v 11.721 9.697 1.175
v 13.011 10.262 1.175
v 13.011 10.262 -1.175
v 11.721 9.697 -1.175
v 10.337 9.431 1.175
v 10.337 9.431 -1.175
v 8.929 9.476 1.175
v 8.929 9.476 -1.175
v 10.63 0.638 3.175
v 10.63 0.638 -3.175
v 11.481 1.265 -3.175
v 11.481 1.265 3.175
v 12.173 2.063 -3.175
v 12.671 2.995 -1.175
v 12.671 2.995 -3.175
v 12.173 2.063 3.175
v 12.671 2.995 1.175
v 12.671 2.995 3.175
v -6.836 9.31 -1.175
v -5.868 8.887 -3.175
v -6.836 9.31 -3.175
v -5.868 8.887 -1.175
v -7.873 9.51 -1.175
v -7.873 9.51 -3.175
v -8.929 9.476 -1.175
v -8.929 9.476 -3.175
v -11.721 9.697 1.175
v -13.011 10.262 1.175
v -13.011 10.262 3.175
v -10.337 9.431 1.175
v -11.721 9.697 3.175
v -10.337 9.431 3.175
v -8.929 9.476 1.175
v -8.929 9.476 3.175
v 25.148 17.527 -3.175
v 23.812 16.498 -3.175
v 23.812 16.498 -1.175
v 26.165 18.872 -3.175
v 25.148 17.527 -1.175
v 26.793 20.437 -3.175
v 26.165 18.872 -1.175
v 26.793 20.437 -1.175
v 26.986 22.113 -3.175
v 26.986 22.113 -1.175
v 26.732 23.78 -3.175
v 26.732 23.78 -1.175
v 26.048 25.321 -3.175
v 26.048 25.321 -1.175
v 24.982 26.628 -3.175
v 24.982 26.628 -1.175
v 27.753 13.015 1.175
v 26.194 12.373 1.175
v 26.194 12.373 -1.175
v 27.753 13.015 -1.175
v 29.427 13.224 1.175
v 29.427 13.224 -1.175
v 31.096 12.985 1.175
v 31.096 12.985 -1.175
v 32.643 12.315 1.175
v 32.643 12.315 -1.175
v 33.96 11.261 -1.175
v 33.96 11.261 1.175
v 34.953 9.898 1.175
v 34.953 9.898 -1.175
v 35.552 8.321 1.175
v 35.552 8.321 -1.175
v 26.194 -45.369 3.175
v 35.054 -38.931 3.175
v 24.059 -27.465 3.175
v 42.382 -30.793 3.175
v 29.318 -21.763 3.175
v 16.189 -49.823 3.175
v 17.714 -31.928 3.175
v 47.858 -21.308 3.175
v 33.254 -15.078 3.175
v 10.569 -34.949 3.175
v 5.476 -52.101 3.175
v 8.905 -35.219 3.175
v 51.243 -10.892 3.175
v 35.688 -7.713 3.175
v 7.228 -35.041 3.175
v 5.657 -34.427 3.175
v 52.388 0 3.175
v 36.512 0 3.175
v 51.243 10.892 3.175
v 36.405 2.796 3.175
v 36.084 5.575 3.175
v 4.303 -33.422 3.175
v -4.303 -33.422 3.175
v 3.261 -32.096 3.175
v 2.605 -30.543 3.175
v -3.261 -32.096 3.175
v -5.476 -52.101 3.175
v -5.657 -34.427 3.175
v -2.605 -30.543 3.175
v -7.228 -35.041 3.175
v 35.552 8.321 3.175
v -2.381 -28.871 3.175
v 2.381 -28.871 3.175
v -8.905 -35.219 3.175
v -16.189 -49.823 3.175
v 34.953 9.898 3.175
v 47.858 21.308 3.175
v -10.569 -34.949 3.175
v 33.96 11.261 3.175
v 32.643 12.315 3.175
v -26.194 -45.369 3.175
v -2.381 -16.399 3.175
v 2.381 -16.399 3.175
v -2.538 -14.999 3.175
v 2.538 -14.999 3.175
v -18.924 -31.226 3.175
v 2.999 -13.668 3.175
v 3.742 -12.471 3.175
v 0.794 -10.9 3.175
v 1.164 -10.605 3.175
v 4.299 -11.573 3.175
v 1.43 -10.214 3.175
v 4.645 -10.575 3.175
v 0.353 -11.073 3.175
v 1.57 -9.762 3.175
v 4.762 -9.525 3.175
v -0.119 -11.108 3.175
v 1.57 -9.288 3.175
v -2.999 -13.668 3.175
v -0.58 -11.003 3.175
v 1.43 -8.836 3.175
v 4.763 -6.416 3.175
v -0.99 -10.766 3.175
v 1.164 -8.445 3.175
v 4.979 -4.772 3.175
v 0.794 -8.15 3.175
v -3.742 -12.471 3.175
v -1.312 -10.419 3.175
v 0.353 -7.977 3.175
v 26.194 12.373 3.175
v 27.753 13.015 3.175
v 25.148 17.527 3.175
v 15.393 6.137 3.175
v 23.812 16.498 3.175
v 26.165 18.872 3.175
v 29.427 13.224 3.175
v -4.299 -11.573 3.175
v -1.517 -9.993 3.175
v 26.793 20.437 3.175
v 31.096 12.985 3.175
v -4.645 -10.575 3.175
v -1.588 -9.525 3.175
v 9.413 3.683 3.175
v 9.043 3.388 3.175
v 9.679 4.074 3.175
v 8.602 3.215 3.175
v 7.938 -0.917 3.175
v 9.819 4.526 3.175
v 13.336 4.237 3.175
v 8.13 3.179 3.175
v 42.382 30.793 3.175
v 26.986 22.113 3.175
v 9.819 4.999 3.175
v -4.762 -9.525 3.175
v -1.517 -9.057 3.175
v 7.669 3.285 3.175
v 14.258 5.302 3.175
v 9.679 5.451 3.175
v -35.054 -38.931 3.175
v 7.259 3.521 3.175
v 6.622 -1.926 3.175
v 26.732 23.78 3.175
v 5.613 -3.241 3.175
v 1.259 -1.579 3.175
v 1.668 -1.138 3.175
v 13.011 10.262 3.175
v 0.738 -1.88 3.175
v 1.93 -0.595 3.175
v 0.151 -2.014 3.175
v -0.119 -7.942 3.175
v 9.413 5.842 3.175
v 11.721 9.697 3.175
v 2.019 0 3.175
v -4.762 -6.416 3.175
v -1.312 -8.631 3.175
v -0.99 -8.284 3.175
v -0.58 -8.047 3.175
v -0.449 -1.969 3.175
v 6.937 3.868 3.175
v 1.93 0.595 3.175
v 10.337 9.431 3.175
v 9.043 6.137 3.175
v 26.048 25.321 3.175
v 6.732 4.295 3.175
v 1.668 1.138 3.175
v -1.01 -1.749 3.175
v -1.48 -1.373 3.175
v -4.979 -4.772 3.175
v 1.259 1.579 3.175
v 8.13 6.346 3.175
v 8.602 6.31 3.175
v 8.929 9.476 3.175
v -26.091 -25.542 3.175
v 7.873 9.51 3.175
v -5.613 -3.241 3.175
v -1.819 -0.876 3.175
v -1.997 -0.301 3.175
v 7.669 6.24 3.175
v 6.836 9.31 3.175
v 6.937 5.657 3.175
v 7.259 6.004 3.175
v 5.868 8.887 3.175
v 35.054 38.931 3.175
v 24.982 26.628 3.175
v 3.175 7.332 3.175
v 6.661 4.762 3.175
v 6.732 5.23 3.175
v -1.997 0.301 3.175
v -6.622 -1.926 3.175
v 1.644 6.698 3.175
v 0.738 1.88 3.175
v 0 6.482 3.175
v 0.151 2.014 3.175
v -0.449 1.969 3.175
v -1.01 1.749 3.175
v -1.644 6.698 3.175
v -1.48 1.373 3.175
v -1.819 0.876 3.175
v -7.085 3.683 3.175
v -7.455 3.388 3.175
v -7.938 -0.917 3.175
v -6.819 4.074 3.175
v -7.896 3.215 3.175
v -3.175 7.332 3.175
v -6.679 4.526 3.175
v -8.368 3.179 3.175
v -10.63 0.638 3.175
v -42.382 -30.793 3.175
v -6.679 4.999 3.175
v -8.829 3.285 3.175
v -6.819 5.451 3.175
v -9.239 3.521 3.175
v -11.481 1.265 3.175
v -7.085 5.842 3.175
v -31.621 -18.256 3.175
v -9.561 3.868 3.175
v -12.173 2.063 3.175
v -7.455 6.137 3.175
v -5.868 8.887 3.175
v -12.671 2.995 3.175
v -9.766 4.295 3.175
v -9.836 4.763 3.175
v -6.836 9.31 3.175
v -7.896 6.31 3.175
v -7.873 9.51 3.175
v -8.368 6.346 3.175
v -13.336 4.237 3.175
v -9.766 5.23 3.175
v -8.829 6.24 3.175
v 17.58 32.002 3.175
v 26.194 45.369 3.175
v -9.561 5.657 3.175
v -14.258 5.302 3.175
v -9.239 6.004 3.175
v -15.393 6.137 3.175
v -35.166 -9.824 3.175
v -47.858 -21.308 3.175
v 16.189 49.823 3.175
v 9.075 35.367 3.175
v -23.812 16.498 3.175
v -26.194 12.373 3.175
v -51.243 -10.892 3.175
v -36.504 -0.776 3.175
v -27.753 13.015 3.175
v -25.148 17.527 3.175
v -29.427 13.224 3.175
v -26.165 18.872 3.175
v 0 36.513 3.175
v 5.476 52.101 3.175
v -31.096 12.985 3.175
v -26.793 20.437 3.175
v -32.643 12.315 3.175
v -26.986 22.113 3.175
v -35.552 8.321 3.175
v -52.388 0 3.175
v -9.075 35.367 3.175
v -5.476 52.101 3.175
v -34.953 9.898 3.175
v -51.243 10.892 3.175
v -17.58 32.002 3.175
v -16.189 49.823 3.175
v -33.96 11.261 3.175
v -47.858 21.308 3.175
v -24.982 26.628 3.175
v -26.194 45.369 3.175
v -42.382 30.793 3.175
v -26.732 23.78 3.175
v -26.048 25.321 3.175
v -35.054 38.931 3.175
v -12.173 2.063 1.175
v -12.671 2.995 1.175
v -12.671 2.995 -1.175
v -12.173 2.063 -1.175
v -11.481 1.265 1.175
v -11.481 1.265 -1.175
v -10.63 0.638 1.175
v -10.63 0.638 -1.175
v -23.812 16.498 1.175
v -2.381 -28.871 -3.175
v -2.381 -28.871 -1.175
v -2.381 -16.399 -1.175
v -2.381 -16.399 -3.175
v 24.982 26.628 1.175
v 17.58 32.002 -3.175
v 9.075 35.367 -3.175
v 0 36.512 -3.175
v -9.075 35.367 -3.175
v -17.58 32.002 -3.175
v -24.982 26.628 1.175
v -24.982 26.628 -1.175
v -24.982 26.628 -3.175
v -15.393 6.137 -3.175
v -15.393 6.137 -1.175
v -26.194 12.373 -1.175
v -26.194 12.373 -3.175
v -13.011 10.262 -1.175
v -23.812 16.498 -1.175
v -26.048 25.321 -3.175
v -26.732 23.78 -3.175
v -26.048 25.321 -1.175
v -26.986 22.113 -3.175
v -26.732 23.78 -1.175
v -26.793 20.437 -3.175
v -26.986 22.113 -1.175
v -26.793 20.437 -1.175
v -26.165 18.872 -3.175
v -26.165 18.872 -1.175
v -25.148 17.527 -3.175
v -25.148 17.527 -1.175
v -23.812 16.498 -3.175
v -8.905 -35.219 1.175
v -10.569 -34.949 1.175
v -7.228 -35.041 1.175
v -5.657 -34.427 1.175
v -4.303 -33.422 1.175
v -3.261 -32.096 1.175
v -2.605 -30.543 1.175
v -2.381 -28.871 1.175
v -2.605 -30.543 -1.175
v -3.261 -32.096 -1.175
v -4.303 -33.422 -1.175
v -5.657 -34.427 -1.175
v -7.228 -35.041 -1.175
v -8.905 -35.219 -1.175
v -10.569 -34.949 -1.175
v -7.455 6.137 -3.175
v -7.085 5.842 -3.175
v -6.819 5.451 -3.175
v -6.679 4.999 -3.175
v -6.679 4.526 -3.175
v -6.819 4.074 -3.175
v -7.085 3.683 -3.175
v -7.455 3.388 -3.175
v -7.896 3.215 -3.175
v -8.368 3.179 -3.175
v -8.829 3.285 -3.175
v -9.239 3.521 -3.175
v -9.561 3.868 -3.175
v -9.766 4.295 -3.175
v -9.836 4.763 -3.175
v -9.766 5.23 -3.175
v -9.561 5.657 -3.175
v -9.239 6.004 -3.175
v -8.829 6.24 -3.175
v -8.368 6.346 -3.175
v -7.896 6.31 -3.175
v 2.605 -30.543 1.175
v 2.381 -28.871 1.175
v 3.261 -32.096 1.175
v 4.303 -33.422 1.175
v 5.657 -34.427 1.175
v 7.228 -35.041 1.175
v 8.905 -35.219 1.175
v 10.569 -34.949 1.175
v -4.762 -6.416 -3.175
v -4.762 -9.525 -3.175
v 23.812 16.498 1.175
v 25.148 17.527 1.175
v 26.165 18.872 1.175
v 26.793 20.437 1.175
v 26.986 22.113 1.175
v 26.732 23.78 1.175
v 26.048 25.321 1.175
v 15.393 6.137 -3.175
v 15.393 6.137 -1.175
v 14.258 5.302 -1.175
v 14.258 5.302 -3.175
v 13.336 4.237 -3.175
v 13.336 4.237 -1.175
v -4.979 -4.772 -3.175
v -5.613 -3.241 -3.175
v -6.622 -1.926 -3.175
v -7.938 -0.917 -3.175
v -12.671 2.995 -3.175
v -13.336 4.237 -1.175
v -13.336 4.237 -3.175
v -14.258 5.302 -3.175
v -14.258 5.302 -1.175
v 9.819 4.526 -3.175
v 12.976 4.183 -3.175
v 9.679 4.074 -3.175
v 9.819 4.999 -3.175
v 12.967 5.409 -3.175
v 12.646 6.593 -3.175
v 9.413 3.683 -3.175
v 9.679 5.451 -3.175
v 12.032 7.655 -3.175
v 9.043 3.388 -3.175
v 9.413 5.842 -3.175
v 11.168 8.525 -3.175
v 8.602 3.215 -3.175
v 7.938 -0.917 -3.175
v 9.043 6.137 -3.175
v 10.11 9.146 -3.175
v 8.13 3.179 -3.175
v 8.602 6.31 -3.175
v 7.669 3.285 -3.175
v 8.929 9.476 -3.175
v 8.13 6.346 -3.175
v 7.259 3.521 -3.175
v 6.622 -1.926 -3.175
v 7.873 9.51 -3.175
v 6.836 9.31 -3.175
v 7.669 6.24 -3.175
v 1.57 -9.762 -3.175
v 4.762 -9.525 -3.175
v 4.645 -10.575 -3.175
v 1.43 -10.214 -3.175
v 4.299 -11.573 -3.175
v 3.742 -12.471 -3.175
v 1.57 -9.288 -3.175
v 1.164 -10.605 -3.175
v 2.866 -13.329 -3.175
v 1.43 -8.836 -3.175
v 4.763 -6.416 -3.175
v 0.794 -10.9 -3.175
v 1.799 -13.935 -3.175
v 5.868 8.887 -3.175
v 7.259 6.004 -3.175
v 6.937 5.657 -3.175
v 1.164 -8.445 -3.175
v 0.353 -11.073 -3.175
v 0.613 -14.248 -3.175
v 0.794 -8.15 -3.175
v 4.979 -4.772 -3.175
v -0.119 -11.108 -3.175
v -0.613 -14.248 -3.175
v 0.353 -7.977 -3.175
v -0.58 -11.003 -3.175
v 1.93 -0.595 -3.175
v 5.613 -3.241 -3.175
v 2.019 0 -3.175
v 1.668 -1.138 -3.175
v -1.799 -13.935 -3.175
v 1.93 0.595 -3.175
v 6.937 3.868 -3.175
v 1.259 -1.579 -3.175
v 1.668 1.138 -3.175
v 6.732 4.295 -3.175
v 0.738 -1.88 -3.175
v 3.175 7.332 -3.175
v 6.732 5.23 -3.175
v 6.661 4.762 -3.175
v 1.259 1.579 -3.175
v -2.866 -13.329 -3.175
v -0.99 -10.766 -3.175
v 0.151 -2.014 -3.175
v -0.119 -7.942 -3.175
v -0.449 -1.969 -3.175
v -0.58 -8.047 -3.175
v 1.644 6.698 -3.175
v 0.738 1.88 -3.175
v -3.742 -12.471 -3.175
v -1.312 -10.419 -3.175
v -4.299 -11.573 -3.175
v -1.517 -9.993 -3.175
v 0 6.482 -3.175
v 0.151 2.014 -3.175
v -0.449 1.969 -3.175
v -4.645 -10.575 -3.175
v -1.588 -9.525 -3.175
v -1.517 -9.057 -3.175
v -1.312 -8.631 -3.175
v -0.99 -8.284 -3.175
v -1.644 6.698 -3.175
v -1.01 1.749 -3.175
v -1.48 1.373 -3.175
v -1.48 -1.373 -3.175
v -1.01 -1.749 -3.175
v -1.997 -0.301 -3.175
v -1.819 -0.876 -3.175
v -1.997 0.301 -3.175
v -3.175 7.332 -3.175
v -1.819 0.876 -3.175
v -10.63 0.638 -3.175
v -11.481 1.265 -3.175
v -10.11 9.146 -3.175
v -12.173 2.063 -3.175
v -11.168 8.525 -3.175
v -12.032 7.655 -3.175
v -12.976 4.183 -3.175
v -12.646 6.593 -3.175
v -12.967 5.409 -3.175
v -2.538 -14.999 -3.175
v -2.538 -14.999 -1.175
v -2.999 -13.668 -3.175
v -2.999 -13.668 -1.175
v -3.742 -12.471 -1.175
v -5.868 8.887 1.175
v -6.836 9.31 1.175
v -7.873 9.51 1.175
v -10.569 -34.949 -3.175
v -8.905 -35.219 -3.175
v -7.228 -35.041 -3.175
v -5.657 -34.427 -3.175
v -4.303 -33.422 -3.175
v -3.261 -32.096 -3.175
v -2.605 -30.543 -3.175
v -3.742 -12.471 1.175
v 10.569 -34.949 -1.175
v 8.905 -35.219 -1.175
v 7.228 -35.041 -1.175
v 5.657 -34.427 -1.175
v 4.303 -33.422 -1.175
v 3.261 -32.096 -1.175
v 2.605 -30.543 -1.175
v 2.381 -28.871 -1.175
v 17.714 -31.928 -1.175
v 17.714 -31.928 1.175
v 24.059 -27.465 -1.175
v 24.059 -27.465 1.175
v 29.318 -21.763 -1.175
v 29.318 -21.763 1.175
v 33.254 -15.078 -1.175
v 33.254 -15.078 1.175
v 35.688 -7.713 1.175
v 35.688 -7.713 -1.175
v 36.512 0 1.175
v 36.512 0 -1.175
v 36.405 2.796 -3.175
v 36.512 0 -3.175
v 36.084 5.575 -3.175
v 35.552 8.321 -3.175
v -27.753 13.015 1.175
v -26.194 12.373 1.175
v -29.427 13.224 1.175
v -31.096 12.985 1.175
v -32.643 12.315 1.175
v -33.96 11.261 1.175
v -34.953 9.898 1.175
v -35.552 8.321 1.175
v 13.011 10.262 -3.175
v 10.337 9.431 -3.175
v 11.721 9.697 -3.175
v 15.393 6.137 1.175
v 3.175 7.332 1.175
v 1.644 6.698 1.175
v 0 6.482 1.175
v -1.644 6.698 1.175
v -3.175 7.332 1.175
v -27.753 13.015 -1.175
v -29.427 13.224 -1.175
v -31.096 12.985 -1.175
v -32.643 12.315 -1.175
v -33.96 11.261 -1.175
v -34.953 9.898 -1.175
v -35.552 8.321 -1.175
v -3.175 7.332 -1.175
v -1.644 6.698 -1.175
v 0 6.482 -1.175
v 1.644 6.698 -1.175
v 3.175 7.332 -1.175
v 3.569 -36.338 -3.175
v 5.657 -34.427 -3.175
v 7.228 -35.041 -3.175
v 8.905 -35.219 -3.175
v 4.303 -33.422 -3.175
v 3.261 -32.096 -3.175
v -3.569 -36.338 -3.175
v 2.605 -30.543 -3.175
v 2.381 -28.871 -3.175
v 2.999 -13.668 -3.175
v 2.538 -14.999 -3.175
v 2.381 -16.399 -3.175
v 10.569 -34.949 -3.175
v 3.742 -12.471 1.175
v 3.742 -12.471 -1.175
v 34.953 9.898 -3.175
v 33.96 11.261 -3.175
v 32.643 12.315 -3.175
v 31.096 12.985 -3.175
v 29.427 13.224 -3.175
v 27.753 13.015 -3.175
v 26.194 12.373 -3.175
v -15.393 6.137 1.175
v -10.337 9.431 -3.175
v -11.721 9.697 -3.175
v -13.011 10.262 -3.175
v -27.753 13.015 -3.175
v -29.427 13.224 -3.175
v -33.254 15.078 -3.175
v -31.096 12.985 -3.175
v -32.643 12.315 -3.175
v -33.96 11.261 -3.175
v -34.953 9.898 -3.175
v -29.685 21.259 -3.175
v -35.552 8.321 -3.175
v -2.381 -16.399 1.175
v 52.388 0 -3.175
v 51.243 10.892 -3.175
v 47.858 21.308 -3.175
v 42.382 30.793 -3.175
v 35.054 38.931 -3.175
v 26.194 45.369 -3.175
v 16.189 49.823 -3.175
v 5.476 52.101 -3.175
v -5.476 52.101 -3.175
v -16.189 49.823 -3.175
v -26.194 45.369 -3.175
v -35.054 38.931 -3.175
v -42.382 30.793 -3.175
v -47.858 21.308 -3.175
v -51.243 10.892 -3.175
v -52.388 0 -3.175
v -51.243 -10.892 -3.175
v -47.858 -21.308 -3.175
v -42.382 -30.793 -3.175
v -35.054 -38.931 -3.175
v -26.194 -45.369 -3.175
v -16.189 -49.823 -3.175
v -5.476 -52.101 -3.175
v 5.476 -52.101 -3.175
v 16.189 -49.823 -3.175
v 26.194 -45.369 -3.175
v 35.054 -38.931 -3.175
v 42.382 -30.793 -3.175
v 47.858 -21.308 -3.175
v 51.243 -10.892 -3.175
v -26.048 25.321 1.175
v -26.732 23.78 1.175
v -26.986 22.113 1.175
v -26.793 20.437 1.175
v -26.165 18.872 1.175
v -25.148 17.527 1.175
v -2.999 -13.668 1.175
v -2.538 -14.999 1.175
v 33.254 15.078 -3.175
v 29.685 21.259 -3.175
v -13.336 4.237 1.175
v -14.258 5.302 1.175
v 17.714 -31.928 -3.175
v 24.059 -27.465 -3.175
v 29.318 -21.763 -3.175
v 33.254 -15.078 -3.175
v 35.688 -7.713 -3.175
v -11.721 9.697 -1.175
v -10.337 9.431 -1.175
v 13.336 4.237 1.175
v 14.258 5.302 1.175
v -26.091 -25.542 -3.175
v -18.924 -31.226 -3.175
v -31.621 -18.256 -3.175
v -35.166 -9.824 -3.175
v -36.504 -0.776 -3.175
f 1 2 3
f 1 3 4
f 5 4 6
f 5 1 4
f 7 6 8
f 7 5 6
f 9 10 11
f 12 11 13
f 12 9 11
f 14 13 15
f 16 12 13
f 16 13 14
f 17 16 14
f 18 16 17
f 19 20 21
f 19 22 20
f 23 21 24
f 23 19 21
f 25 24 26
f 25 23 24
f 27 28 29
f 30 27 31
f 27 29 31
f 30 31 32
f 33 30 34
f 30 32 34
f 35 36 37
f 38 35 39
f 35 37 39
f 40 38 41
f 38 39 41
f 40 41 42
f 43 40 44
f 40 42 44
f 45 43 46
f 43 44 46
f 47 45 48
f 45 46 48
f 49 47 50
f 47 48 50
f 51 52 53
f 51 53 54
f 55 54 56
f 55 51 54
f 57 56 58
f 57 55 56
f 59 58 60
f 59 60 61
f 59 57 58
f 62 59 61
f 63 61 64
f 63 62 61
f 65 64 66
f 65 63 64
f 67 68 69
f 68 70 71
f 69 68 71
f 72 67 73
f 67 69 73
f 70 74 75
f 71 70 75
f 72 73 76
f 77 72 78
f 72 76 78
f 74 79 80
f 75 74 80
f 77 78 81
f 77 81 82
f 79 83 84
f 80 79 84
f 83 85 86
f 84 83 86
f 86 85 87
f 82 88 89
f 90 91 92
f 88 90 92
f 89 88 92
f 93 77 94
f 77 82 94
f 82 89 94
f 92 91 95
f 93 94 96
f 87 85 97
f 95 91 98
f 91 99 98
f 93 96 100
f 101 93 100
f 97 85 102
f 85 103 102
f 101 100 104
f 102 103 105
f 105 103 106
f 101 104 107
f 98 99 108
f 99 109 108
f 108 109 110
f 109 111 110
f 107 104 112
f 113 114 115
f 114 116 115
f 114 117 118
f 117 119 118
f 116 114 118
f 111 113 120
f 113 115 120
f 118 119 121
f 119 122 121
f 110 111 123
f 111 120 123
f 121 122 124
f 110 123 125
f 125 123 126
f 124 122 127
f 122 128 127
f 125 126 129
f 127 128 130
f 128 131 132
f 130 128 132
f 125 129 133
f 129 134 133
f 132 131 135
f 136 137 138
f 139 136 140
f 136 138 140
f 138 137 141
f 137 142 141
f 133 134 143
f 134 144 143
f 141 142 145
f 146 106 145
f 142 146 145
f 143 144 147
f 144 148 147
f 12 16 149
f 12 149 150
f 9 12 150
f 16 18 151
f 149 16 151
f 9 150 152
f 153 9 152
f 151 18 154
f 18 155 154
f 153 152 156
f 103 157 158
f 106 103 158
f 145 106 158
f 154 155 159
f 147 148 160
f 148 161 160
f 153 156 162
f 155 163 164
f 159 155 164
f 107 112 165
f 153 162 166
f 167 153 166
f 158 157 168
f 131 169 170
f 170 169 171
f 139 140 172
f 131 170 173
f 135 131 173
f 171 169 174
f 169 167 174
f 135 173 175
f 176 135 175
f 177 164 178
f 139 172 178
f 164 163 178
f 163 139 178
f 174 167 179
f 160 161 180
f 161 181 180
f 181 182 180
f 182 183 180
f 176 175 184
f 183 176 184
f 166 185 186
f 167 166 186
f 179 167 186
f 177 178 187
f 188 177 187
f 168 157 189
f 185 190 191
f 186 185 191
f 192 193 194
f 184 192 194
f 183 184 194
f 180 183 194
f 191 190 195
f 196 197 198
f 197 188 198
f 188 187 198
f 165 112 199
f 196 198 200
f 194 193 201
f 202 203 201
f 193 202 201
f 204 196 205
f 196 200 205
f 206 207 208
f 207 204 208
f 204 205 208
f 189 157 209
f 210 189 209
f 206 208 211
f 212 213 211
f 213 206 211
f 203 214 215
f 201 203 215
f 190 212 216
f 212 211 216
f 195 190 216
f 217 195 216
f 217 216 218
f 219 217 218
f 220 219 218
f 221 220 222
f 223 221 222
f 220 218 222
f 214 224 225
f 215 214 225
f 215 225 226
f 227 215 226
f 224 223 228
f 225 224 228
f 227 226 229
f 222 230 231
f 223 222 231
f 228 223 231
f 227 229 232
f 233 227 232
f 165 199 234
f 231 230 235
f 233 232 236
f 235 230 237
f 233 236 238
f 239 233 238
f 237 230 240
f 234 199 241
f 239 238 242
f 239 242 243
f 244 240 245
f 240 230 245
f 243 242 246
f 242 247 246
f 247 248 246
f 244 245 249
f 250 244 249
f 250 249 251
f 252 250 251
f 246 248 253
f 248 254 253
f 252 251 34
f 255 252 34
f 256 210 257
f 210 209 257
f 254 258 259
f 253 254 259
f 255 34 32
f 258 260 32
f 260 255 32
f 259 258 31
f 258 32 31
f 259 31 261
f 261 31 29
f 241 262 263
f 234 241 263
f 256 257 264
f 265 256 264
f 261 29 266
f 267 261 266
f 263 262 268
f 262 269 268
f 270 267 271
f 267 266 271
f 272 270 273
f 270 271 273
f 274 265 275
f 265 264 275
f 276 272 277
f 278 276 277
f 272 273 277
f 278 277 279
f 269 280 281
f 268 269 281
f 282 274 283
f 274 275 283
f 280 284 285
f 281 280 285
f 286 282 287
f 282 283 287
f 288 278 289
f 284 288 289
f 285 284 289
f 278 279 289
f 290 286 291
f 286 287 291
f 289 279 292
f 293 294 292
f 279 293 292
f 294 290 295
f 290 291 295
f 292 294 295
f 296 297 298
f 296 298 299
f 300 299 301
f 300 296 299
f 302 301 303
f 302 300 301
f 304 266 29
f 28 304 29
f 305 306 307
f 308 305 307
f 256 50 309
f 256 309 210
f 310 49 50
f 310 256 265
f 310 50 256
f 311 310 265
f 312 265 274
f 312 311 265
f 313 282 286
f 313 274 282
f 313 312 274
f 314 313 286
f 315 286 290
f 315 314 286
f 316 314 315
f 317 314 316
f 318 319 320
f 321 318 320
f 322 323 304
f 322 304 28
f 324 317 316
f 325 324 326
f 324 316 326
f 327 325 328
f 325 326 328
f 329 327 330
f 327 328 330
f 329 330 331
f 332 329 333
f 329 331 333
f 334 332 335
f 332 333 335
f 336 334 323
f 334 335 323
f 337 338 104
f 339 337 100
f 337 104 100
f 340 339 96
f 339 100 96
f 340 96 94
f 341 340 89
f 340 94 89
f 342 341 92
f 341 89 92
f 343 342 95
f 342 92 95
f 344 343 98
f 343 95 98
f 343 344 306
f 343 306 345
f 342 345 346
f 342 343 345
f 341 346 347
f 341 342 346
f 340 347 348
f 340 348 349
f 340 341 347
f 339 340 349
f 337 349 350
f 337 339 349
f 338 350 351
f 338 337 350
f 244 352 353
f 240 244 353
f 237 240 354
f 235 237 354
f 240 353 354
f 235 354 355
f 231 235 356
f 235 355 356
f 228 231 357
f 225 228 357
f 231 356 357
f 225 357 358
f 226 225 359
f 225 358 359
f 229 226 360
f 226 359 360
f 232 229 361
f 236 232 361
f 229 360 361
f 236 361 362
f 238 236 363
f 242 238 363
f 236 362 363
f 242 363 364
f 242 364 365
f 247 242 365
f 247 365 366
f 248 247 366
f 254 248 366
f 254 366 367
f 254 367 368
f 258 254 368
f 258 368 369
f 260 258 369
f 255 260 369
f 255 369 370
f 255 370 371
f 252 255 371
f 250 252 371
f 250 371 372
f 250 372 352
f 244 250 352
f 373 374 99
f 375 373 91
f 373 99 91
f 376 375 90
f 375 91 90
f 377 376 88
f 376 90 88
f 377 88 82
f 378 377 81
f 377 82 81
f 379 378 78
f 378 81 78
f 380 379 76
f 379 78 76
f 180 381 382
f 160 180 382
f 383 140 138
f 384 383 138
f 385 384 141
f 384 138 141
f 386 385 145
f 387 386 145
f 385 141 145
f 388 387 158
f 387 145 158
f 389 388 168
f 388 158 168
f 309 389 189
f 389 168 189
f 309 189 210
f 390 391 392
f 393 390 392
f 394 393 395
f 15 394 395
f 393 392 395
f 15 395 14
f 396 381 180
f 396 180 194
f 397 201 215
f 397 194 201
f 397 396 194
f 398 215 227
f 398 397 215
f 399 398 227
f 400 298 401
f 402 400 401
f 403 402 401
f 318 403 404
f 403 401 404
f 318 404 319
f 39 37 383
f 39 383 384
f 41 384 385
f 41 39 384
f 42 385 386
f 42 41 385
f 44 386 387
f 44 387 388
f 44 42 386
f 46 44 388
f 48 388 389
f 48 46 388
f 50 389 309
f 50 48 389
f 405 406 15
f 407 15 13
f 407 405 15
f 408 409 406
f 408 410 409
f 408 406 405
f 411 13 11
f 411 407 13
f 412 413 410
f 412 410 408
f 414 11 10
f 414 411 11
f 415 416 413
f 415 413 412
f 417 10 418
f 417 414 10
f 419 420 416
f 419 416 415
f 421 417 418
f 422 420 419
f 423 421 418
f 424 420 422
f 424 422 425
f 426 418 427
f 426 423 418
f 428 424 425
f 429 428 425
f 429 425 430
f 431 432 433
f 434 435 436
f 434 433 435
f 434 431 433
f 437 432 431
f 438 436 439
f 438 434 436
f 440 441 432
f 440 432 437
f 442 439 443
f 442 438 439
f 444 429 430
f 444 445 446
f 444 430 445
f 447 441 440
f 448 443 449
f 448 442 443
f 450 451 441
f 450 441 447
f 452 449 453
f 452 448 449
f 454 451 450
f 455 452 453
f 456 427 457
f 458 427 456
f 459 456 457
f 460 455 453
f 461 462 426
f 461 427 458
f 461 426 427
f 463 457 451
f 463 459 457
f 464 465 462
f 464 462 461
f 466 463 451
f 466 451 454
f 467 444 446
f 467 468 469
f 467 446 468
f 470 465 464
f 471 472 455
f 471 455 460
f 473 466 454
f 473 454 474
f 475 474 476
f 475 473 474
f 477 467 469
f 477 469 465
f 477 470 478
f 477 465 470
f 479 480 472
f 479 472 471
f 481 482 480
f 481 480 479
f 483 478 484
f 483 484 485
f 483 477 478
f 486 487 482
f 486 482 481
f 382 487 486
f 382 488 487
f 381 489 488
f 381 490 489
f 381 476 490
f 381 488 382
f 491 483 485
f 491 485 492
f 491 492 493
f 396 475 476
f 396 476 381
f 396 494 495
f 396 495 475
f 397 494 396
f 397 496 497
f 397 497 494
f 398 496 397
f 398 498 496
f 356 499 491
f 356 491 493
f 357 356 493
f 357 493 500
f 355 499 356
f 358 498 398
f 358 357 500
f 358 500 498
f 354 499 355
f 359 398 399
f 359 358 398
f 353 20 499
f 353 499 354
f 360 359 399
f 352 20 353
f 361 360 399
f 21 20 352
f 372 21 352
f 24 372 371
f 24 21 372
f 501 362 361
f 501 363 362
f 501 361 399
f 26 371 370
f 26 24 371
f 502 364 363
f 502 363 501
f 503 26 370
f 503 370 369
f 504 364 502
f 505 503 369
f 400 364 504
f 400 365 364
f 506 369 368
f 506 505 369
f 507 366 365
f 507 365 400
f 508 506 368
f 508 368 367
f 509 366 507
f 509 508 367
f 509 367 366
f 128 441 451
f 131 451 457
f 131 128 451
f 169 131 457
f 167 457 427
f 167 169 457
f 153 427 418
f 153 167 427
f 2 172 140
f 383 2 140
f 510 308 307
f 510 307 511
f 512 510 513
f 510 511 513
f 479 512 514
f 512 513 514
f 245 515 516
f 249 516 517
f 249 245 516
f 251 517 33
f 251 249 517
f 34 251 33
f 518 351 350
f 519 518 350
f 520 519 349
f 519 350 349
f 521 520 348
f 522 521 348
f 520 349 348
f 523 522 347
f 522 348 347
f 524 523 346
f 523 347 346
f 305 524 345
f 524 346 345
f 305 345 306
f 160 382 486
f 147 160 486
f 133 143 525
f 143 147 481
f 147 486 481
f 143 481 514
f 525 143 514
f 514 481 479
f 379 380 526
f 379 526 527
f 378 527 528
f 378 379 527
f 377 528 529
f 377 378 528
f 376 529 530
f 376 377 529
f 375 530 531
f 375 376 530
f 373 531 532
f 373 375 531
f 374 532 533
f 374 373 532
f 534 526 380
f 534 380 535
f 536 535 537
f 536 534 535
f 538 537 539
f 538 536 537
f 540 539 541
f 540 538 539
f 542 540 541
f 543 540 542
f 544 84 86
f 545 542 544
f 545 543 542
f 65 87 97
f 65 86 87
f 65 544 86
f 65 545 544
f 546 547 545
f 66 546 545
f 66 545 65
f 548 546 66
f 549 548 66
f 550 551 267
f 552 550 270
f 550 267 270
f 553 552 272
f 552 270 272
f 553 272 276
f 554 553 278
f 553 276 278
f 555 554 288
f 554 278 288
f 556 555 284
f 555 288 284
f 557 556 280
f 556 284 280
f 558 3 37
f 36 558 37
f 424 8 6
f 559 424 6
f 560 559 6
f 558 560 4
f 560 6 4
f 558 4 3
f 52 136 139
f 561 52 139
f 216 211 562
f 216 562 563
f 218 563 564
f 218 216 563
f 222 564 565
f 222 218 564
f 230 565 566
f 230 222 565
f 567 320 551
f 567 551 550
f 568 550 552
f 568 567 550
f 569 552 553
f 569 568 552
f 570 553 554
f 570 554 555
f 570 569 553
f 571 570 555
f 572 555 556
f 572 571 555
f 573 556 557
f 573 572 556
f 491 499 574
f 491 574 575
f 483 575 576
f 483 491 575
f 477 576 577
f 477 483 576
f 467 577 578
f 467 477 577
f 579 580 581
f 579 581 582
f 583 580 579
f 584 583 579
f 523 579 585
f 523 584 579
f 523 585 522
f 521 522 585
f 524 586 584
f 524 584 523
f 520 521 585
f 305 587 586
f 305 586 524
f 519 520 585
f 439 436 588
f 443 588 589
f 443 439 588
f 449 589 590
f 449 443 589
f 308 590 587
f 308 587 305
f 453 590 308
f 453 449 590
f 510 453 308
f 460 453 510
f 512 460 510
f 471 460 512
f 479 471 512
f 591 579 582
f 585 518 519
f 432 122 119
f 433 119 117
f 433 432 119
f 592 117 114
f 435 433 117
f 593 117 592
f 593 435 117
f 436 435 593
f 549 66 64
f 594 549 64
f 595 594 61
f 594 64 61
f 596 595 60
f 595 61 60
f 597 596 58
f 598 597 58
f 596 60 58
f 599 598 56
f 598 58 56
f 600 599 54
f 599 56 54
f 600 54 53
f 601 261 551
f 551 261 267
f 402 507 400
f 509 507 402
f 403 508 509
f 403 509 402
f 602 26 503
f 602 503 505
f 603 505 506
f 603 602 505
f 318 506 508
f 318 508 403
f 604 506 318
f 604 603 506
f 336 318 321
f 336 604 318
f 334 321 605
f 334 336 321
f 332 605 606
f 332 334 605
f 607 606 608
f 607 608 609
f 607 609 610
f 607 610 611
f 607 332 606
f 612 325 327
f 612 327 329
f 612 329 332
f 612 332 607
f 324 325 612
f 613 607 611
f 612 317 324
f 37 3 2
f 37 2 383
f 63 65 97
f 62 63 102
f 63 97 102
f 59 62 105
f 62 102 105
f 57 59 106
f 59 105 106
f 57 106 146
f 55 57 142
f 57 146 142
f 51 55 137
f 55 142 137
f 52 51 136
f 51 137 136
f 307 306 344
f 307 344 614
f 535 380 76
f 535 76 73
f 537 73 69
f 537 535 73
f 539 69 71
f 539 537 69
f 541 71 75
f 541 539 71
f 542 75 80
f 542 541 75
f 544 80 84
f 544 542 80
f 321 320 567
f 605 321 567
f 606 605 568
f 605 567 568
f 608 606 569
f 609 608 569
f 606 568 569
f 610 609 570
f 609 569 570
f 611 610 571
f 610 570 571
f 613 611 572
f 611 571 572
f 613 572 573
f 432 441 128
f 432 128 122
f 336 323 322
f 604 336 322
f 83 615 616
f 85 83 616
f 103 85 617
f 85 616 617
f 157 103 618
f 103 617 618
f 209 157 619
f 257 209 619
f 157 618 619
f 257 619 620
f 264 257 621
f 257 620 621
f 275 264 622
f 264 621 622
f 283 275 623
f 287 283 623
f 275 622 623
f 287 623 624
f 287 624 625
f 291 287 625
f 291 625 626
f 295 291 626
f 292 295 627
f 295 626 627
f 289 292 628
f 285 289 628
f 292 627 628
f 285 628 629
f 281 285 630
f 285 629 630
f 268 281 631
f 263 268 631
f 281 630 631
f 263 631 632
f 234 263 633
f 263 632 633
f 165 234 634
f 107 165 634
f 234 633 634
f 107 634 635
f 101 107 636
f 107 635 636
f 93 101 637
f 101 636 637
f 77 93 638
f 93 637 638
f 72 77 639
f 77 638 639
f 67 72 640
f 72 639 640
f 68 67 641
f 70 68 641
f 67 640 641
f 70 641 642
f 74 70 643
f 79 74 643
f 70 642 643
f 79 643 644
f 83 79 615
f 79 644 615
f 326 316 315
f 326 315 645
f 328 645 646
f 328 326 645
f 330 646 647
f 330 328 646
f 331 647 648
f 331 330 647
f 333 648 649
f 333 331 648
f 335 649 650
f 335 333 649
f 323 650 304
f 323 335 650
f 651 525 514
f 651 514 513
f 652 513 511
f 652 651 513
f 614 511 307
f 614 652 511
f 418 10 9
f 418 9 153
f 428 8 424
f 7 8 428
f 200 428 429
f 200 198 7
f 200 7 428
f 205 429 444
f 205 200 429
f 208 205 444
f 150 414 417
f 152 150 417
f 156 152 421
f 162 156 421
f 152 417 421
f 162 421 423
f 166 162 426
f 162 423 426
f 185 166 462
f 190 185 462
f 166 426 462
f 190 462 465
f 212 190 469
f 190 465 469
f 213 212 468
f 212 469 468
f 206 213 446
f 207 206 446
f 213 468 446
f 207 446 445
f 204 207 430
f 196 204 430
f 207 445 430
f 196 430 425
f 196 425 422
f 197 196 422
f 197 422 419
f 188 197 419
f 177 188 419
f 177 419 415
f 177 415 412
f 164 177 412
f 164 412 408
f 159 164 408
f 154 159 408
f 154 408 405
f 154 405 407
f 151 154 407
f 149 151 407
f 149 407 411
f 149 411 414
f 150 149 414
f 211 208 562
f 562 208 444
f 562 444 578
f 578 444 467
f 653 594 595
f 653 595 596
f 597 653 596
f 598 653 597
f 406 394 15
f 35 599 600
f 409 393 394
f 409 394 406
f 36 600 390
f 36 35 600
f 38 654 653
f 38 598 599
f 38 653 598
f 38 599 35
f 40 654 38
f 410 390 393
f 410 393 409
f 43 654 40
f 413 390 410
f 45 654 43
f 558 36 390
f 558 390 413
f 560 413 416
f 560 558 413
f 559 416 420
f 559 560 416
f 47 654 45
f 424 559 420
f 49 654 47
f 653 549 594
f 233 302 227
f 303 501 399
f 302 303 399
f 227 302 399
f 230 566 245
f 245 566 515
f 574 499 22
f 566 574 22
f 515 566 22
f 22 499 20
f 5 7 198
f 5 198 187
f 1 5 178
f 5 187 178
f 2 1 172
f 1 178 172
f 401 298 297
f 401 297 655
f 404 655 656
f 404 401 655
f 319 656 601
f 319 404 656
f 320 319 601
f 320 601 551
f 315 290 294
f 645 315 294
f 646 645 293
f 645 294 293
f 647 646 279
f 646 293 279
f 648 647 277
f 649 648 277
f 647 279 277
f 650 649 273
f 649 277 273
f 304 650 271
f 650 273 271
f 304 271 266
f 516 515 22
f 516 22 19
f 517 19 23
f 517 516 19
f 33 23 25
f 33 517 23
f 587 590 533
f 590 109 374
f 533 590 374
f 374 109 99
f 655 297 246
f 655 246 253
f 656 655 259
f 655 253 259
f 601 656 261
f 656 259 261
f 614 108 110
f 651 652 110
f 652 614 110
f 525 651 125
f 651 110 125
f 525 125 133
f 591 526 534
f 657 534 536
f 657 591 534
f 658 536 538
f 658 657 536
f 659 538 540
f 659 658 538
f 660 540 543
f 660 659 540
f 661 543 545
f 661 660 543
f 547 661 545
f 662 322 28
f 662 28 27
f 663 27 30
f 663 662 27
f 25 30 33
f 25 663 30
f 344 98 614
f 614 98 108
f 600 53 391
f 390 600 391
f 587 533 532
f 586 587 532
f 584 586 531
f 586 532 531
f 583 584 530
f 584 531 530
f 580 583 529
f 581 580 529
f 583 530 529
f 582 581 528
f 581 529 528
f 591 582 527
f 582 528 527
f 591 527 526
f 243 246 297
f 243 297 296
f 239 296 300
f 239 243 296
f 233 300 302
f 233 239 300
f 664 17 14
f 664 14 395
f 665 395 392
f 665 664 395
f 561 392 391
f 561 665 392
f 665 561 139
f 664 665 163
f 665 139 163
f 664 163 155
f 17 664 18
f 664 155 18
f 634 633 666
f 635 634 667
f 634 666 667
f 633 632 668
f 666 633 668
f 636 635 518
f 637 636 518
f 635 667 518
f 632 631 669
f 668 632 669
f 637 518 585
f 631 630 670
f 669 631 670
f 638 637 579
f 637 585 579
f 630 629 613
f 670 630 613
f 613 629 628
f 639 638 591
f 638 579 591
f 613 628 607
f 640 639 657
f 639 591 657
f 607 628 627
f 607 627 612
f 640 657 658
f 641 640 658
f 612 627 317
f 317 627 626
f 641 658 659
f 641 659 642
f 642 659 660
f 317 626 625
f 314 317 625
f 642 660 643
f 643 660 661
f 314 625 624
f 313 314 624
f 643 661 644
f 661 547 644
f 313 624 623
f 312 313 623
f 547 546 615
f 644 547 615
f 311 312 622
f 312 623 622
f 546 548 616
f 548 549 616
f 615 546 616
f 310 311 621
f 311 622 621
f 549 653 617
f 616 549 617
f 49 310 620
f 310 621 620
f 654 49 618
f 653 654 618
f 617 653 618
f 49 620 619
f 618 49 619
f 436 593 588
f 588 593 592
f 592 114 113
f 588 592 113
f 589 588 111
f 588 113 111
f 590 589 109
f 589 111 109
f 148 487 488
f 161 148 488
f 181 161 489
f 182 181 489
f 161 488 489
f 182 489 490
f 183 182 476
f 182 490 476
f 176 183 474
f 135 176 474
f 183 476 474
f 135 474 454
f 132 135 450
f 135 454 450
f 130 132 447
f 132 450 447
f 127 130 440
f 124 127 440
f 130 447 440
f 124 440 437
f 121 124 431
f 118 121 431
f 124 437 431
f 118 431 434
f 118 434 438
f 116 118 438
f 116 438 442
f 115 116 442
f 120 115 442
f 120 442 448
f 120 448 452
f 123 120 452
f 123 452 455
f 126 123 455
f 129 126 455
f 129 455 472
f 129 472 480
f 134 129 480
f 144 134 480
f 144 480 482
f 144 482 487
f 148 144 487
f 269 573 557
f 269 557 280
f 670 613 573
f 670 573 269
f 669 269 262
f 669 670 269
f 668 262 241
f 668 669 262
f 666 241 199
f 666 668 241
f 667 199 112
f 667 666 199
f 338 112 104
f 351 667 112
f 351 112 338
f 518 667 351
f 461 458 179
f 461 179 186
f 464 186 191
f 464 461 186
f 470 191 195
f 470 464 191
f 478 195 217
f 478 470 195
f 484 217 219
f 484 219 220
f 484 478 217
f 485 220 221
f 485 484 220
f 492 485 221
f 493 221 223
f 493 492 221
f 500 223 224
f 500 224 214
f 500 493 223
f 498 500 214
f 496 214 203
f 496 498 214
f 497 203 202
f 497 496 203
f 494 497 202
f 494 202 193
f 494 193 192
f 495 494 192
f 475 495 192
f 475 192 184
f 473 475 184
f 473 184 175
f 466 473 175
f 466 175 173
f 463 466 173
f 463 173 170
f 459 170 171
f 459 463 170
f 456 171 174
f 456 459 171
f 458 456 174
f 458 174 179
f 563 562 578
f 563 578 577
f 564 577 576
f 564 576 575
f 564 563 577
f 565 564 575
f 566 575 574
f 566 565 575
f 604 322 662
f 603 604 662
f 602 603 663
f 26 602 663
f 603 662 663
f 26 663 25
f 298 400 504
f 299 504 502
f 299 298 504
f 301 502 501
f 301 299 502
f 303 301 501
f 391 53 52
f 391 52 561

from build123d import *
from build123d.topology import SkipClean

# Parameters (mm, degrees)
BOSS_EXTRUDE1_DEPTH              = 3.175
BOSS_EXTRUDE1_DEPTH_BACK         = 3.175
SKETCH1_R                        = 52.3875
SKETCH1_R_2                      = 2.0193
SHAFT_COUPLER_BOLT_D             = 3.175
SHAFT_COUPLER_BOLT_PATTERN_COUNT = 3
SKETCH6_R                        = 36.5125
CUT_EXTRUDE2_DEPTH               = 2
VOID_CUT_DEPTH                   = 75.214707521
VOID_CUT_DEPTH_BACK              = 75.214707521
TOOLING_RADIUS_R                 = 6.35
BOSS_EXTRUDE2_START              = -4.35
BOSS_EXTRUDE2_DEPTH              = 6.35


# Read off the part's stored shape, not the designer's step: Boss-Extrude2
with BuildPart() as part:
    # Sketch1 → Boss-Extrude1 (new, two sides: drawn at the far end of the back side and taken through both)
    with BuildSketch(Plane.XY.offset(-BOSS_EXTRUDE1_DEPTH_BACK)):
        Circle(SKETCH1_R)
        Circle(SKETCH1_R_2, mode=Mode.SUBTRACT)
    extrude(amount=BOSS_EXTRUDE1_DEPTH + BOSS_EXTRUDE1_DEPTH_BACK)

    # SHAFT-COUPLER-BOLT (through all)
    with Locations(Plane.XY.offset(3.175)):
        with Locations((0, -9.525)):
            shaft_coupler_bolt = Hole(SHAFT_COUPLER_BOLT_D / 2)

    # SHAFT-COUPLER-BOLT-PATTERN: SHAFT-COUPLER-BOLT ×3 about axis
    shaft_coupler_bolt_pattern_axis = Axis((0, 0, 0), (0, 0, 1))
    for i in range(1, SHAFT_COUPLER_BOLT_PATTERN_COUNT):
        add(shaft_coupler_bolt.rotate(shaft_coupler_bolt_pattern_axis, i * 360 / SHAFT_COUPLER_BOLT_PATTERN_COUNT), mode=Mode.SUBTRACT)

    # Sketch6 → Cut-Extrude2 (cut)
    with BuildSketch(Plane.XY.offset(3.175)):
        Circle(SKETCH6_R)
        with BuildLine():
            Line((4.7625, -9.525), (4.7625, -2.749630657))
            Line((4.7625, -2.749630657), (10.630141971, 0.638054014))
            ThreePointArc((10.630141971, 0.638054014), (12.373337957, 7.14375), (5.867641971, 8.886945986))
            Line((5.867641971, 8.886945986), (0, 5.499261314))
            Line((0, 5.499261314), (-5.867641971, 8.886945986))
            ThreePointArc((-5.867641971, 8.886945986), (-12.373337957, 7.14375), (-10.630141971, 0.638054014))
            Line((-10.630141971, 0.638054014), (-4.7625, -2.749630657))
            Line((-4.7625, -2.749630657), (-4.7625, -9.525))
            ThreePointArc((-4.7625, -9.525), (0, -14.2875), (4.7625, -9.525))
        make_face(mode=Mode.SUBTRACT)
    cut_extrude2 = extrude(amount=-CUT_EXTRUDE2_DEPTH, mode=Mode.SUBTRACT)

    # Mirror1: Cut-Extrude2 across plane
    add(cut_extrude2.mirror(Plane.XY), mode=Mode.SUBTRACT)

    # Sketch7 → VOID-CUT (cut, two sides: drawn at the far end of the back side and taken through both)
    with BuildSketch(Plane.XY.offset(1.175).offset(-VOID_CUT_DEPTH_BACK)):
        with BuildLine():
            Line((2.38125, -13.649445986), (2.38125, -36.434767801))
            ThreePointArc((2.38125, -36.434767801), (26.646838901, -24.962143995), (36.5125, 0))
            ThreePointArc((36.5125, 0), (35.557911417, 8.294431382), (32.744059496, 16.155160908))
            Line((32.744059496, 16.155160908), (13.011391971, 4.7625))
            ThreePointArc((13.011391971, 4.7625), (12.373337957, 2.38125), (10.630141971, 0.638054014))
            Line((10.630141971, 0.638054014), (4.7625, -2.749630657))
            Line((4.7625, -2.749630657), (4.7625, -9.525))
            ThreePointArc((4.7625, -9.525), (4.124445986, -11.90625), (2.38125, -13.649445986))
        make_face()
        with BuildLine():
            ThreePointArc((-32.744059496, 16.155160908), (-31.620752556, -18.25625), (-2.38125, -36.434767801))
            Line((-2.38125, -36.434767801), (-2.38125, -13.649445986))
            ThreePointArc((-2.38125, -13.649445986), (-4.124445986, -11.90625), (-4.7625, -9.525))
            Line((-4.7625, -9.525), (-4.7625, -2.749630657))
            Line((-4.7625, -2.749630657), (-10.630141971, 0.638054014))
            ThreePointArc((-10.630141971, 0.638054014), (-12.373337957, 2.38125), (-13.011391971, 4.7625))
            Line((-13.011391971, 4.7625), (-32.744059496, 16.155160908))
        make_face()
        with BuildLine():
            ThreePointArc((30.362809496, 20.279606893), (0, 36.5125), (-30.362809496, 20.279606893))
            Line((-30.362809496, 20.279606893), (-10.630141971, 8.886945986))
            ThreePointArc((-10.630141971, 8.886945986), (-8.248891971, 9.525), (-5.867641971, 8.886945986))
            Line((-5.867641971, 8.886945986), (0, 5.499261314))
            Line((0, 5.499261314), (5.867641971, 8.886945986))
            ThreePointArc((5.867641971, 8.886945986), (8.248891971, 9.525), (10.630141971, 8.886945986))
            Line((10.630141971, 8.886945986), (30.362809496, 20.279606893))
        make_face()
    extrude(amount=VOID_CUT_DEPTH + VOID_CUT_DEPTH_BACK, mode=Mode.SUBTRACT)

    # TOOLING-RADIUS
    # the kernel refuses this fillet: 6.35 mm, written as the material it adds along each edge
    with BuildSketch(Plane(origin=(32.744059496, 16.155160908, 1.175), x_dir=(0.3373763569350217, -0.9413698496240746, 0), z_dir=(0, 0, -1)), Plane(origin=(30.362809496, 20.279606893, -1.175), x_dir=(-0.6465620256636754, 0.7628614205540117, 0), z_dir=(0, 0, 1)), Plane(origin=(-32.744059496, 16.155160908, -1.175), x_dir=(-0.3373763569350221, -0.9413698496240744, 0), z_dir=(0, 0, 1)), Plane(origin=(-2.38125, -36.434767801, 1.175), x_dir=(-0.9839383825986964, 0.17850842907006217, 0), z_dir=(0, 0, -1))) as tooling_radius_piece_1:
        with BuildLine():
            CenterArc((7.598183278, 6.308632991), TOOLING_RADIUS_R, 169.717107938, 106.826448893)
            Line((1.350174548, 7.442161515), (0, 0))
            ThreePointArc((0, 0), (4.16090989, -0.237860303), (8.32181978, 0))
        make_face()
    extrude(amount=2.35)
    with BuildSketch(Plane(origin=(2.38125, -36.434767801, 1.175), x_dir=(0.9839383825986963, 0.17850842907006276, 0), z_dir=(0, 0, -1)), Plane(origin=(-30.362809496, 20.279606893, -1.175), x_dir=(0.6465620256636744, 0.7628614205540126, 0), z_dir=(0, 0, 1))) as tooling_radius_piece_2:
        with BuildLine():
            CenterArc((7.598183278, -6.308632991), TOOLING_RADIUS_R, 83.456443169, 106.826448893)
            Line((1.350174548, -7.442161515), (0, 0))
            ThreePointArc((0, 0), (4.16090989, 0.237860303), (8.32181978, 0))
        make_face()
    extrude(amount=2.35)
    with BuildSketch(Plane(origin=(2.38125, -13.649445986, -1.175), x_dir=(0, -1, 0), z_dir=(0, 0, 1)), Plane(origin=(13.011391971, 4.7625, 1.175), x_dir=(0.866025403784439, 0.4999999999999993, 0), z_dir=(0, 0, -1)), Plane(origin=(-13.011391971, 4.7625, -1.175), x_dir=(-0.8660254037844386, 0.5000000000000001, 0), z_dir=(0, 0, 1)), Plane(origin=(-2.38125, -13.649445986, 1.175), x_dir=(0, -1, 0), z_dir=(0, 0, -1))) as tooling_radius_piece_3:
        with BuildLine():
            CenterArc((2.749630657, 6.35), TOOLING_RADIUS_R, 231.786789298, 38.213210702)
            ThreePointArc((-1.178413139, 1.360714286), (-0.52433438, 0.736538107), (0, 0))
            Line((0, 0), (2.749630657, 0))
        make_face()
    extrude(amount=2.35)
    with BuildSketch(Plane(origin=(10.630141971, 8.886945986, 1.175), x_dir=(0.8660254037844393, 0.4999999999999988, 0), z_dir=(0, 0, -1)), Plane(origin=(-10.630141971, 8.886945986, -1.175), x_dir=(-0.8660254037844384, 0.5000000000000004, 0), z_dir=(0, 0, 1))) as tooling_radius_piece_4:
        with BuildLine():
            CenterArc((2.749630657, -6.35), TOOLING_RADIUS_R, 90, 38.213210702)
            ThreePointArc((-1.178413139, -1.360714286), (-0.52433438, -0.736538107), (0, 0))
            Line((0, 0), (2.749630657, 0))
        make_face()
    extrude(amount=2.35)
    with BuildSketch(Plane(origin=(-4.7625, -2.749630657, -1.175), x_dir=(-0.8660254037844364, 0.5000000000000039, 0), z_dir=(0, 0, 1)), Plane(origin=(4.7625, -2.749630657, -1.175), x_dir=(0, -1, 0), z_dir=(0, 0, 1))) as tooling_radius_piece_5:
        with BuildLine():
            CenterArc((TOOLING_RADIUS_R * 0.57735026919, TOOLING_RADIUS_R), TOOLING_RADIUS_R, 210, 60)
            Line((-TOOLING_RADIUS_R * 0.288675134595, TOOLING_RADIUS_R * 0.5), (0, 0))
            Line((0, 0), (TOOLING_RADIUS_R * 0.57735026919, 0))
        make_face()
    extrude(amount=2.35)
    with BuildSketch(Plane(origin=(0, 5.499261314, 1.175), x_dir=(0.8660254037844363, 0.5000000000000041, 0), z_dir=(0, 0, -1))) as tooling_radius_piece_6:
        with BuildLine():
            CenterArc((TOOLING_RADIUS_R * 0.57735026919, -TOOLING_RADIUS_R), TOOLING_RADIUS_R, 90, 60)
            Line((-TOOLING_RADIUS_R * 0.288675134595, -TOOLING_RADIUS_R * 0.5), (0, 0))
            Line((0, 0), (TOOLING_RADIUS_R * 0.57735026919, 0))
        make_face()
    extrude(amount=2.35)
    with BuildSketch(Plane(origin=(4.7625, -2.749630657, -3.175), x_dir=(0.8660254037844362, 0.5000000000000043, 0), z_dir=(0, 0, 1)), Plane(origin=(0, 5.499261314, -3.175), x_dir=(-0.8660254037844383, 0.5000000000000009, 0), z_dir=(0, 0, 1)), Plane(origin=(-4.7625, -2.749630657, -3.175), x_dir=(0, -1, 0), z_dir=(0, 0, 1))) as tooling_radius_piece_7:
        with BuildLine():
            CenterArc((TOOLING_RADIUS_R * 0.57735026919, -TOOLING_RADIUS_R), TOOLING_RADIUS_R, 90, 60)
            Line((-TOOLING_RADIUS_R * 0.288675134595, -TOOLING_RADIUS_R * 0.5), (0, 0))
            Line((0, 0), (TOOLING_RADIUS_R * 0.57735026919, 0))
        make_face()
    extrude(amount=2)
    with BuildSketch(Plane(origin=(4.7625, -2.749630657, 3.175), x_dir=(0.8660254037844362, 0.5000000000000043, 0), z_dir=(0, 0, -1)), Plane(origin=(0, 5.499261314, 3.175), x_dir=(-0.8660254037844383, 0.5000000000000009, 0), z_dir=(0, 0, -1)), Plane(origin=(-4.7625, -2.749630657, 3.175), x_dir=(0, -1, 0), z_dir=(0, 0, -1))) as tooling_radius_piece_8:
        with BuildLine():
            CenterArc((TOOLING_RADIUS_R * 0.57735026919, TOOLING_RADIUS_R), TOOLING_RADIUS_R, 210, 60)
            Line((-TOOLING_RADIUS_R * 0.288675134595, TOOLING_RADIUS_R * 0.5), (0, 0))
            Line((0, 0), (TOOLING_RADIUS_R * 0.57735026919, 0))
        make_face()
    extrude(amount=2)

    # Boss-Extrude2 outline → Boss-Extrude2 (add)
    with SkipClean():  # the faces are left unmerged after this step: merging them gives an invalid solid
        with BuildSketch(Plane(origin=(0, 0, -1.175), x_dir=(-1, 0, 0), z_dir=(0, 0, -1)).offset(BOSS_EXTRUDE2_START)):
            with BuildLine():
                ThreePointArc((-3.741964286, -12.471032847), (-2.731063991, -14.320551238), (-2.38125, -16.399076643))
                Line((-2.38125, -16.399076643), (-2.38125, -28.871121899))
                ThreePointArc((-2.38125, -28.871121899), (-4.94639879, -33.969886584), (-10.569407895, -34.949252825))
                ThreePointArc((-10.569407895, -34.949252825), (0, -36.5125), (10.569407895, -34.949252825))
                ThreePointArc((10.569407895, -34.949252825), (4.94639879, -33.969886584), (2.38125, -28.871121899))
                Line((2.38125, -28.871121899), (2.38125, -16.399076643))
                ThreePointArc((2.38125, -16.399076643), (2.731063991, -14.320551238), (3.741964286, -12.471032847))
                ThreePointArc((3.741964286, -12.471032847), (0, -14.2875), (-3.741964286, -12.471032847))
            make_face()
            with BuildLine():
                ThreePointArc((-24.982236842, 26.628002152), (-31.620752556, 18.25625), (-35.551644737, 8.321250673))
                ThreePointArc((-35.551644737, 8.321250673), (-31.89198414, 12.701236283), (-26.19375, 12.373337957))
                Line((-26.19375, 12.373337957), (-15.392641971, 6.137315329))
                ThreePointArc((-15.392641971, 6.137315329), (-13.767493164, 4.795104823), (-12.6712134, 2.994880292))
                ThreePointArc((-12.6712134, 2.994880292), (-12.373337957, 7.14375), (-8.929249114, 9.476152555))
                ThreePointArc((-8.929249114, 9.476152555), (-11.036429173, 9.525446415), (-13.011391971, 10.261761314))
                Line((-13.011391971, 10.261761314), (-23.8125, 16.497783942))
                ThreePointArc((-23.8125, 16.497783942), (-26.945585351, 21.268650301), (-24.982236842, 26.628002152))
            make_face()
            with BuildLine():
                ThreePointArc((35.551644737, 8.321250673), (31.620752556, 18.25625), (24.982236842, 26.628002152))
                ThreePointArc((24.982236842, 26.628002152), (26.945585351, 21.268650301), (23.8125, 16.497783942))
                Line((23.8125, 16.497783942), (13.011391971, 10.261761314))
                ThreePointArc((13.011391971, 10.261761314), (11.036429173, 9.525446415), (8.929249114, 9.476152555))
                ThreePointArc((8.929249114, 9.476152555), (12.373337957, 7.14375), (12.6712134, 2.994880292))
                ThreePointArc((12.6712134, 2.994880292), (13.767493164, 4.795104823), (15.392641971, 6.137315329))
                Line((15.392641971, 6.137315329), (26.19375, 12.373337957))
                ThreePointArc((26.19375, 12.373337957), (31.89198414, 12.701236283), (35.551644737, 8.321250673))
            make_face()
        extrude(amount=BOSS_EXTRUDE2_DEPTH)
    add(part.part.scale(1), mode=Mode.REPLACE)  # the faces are merged on a copy


solid = part.part
